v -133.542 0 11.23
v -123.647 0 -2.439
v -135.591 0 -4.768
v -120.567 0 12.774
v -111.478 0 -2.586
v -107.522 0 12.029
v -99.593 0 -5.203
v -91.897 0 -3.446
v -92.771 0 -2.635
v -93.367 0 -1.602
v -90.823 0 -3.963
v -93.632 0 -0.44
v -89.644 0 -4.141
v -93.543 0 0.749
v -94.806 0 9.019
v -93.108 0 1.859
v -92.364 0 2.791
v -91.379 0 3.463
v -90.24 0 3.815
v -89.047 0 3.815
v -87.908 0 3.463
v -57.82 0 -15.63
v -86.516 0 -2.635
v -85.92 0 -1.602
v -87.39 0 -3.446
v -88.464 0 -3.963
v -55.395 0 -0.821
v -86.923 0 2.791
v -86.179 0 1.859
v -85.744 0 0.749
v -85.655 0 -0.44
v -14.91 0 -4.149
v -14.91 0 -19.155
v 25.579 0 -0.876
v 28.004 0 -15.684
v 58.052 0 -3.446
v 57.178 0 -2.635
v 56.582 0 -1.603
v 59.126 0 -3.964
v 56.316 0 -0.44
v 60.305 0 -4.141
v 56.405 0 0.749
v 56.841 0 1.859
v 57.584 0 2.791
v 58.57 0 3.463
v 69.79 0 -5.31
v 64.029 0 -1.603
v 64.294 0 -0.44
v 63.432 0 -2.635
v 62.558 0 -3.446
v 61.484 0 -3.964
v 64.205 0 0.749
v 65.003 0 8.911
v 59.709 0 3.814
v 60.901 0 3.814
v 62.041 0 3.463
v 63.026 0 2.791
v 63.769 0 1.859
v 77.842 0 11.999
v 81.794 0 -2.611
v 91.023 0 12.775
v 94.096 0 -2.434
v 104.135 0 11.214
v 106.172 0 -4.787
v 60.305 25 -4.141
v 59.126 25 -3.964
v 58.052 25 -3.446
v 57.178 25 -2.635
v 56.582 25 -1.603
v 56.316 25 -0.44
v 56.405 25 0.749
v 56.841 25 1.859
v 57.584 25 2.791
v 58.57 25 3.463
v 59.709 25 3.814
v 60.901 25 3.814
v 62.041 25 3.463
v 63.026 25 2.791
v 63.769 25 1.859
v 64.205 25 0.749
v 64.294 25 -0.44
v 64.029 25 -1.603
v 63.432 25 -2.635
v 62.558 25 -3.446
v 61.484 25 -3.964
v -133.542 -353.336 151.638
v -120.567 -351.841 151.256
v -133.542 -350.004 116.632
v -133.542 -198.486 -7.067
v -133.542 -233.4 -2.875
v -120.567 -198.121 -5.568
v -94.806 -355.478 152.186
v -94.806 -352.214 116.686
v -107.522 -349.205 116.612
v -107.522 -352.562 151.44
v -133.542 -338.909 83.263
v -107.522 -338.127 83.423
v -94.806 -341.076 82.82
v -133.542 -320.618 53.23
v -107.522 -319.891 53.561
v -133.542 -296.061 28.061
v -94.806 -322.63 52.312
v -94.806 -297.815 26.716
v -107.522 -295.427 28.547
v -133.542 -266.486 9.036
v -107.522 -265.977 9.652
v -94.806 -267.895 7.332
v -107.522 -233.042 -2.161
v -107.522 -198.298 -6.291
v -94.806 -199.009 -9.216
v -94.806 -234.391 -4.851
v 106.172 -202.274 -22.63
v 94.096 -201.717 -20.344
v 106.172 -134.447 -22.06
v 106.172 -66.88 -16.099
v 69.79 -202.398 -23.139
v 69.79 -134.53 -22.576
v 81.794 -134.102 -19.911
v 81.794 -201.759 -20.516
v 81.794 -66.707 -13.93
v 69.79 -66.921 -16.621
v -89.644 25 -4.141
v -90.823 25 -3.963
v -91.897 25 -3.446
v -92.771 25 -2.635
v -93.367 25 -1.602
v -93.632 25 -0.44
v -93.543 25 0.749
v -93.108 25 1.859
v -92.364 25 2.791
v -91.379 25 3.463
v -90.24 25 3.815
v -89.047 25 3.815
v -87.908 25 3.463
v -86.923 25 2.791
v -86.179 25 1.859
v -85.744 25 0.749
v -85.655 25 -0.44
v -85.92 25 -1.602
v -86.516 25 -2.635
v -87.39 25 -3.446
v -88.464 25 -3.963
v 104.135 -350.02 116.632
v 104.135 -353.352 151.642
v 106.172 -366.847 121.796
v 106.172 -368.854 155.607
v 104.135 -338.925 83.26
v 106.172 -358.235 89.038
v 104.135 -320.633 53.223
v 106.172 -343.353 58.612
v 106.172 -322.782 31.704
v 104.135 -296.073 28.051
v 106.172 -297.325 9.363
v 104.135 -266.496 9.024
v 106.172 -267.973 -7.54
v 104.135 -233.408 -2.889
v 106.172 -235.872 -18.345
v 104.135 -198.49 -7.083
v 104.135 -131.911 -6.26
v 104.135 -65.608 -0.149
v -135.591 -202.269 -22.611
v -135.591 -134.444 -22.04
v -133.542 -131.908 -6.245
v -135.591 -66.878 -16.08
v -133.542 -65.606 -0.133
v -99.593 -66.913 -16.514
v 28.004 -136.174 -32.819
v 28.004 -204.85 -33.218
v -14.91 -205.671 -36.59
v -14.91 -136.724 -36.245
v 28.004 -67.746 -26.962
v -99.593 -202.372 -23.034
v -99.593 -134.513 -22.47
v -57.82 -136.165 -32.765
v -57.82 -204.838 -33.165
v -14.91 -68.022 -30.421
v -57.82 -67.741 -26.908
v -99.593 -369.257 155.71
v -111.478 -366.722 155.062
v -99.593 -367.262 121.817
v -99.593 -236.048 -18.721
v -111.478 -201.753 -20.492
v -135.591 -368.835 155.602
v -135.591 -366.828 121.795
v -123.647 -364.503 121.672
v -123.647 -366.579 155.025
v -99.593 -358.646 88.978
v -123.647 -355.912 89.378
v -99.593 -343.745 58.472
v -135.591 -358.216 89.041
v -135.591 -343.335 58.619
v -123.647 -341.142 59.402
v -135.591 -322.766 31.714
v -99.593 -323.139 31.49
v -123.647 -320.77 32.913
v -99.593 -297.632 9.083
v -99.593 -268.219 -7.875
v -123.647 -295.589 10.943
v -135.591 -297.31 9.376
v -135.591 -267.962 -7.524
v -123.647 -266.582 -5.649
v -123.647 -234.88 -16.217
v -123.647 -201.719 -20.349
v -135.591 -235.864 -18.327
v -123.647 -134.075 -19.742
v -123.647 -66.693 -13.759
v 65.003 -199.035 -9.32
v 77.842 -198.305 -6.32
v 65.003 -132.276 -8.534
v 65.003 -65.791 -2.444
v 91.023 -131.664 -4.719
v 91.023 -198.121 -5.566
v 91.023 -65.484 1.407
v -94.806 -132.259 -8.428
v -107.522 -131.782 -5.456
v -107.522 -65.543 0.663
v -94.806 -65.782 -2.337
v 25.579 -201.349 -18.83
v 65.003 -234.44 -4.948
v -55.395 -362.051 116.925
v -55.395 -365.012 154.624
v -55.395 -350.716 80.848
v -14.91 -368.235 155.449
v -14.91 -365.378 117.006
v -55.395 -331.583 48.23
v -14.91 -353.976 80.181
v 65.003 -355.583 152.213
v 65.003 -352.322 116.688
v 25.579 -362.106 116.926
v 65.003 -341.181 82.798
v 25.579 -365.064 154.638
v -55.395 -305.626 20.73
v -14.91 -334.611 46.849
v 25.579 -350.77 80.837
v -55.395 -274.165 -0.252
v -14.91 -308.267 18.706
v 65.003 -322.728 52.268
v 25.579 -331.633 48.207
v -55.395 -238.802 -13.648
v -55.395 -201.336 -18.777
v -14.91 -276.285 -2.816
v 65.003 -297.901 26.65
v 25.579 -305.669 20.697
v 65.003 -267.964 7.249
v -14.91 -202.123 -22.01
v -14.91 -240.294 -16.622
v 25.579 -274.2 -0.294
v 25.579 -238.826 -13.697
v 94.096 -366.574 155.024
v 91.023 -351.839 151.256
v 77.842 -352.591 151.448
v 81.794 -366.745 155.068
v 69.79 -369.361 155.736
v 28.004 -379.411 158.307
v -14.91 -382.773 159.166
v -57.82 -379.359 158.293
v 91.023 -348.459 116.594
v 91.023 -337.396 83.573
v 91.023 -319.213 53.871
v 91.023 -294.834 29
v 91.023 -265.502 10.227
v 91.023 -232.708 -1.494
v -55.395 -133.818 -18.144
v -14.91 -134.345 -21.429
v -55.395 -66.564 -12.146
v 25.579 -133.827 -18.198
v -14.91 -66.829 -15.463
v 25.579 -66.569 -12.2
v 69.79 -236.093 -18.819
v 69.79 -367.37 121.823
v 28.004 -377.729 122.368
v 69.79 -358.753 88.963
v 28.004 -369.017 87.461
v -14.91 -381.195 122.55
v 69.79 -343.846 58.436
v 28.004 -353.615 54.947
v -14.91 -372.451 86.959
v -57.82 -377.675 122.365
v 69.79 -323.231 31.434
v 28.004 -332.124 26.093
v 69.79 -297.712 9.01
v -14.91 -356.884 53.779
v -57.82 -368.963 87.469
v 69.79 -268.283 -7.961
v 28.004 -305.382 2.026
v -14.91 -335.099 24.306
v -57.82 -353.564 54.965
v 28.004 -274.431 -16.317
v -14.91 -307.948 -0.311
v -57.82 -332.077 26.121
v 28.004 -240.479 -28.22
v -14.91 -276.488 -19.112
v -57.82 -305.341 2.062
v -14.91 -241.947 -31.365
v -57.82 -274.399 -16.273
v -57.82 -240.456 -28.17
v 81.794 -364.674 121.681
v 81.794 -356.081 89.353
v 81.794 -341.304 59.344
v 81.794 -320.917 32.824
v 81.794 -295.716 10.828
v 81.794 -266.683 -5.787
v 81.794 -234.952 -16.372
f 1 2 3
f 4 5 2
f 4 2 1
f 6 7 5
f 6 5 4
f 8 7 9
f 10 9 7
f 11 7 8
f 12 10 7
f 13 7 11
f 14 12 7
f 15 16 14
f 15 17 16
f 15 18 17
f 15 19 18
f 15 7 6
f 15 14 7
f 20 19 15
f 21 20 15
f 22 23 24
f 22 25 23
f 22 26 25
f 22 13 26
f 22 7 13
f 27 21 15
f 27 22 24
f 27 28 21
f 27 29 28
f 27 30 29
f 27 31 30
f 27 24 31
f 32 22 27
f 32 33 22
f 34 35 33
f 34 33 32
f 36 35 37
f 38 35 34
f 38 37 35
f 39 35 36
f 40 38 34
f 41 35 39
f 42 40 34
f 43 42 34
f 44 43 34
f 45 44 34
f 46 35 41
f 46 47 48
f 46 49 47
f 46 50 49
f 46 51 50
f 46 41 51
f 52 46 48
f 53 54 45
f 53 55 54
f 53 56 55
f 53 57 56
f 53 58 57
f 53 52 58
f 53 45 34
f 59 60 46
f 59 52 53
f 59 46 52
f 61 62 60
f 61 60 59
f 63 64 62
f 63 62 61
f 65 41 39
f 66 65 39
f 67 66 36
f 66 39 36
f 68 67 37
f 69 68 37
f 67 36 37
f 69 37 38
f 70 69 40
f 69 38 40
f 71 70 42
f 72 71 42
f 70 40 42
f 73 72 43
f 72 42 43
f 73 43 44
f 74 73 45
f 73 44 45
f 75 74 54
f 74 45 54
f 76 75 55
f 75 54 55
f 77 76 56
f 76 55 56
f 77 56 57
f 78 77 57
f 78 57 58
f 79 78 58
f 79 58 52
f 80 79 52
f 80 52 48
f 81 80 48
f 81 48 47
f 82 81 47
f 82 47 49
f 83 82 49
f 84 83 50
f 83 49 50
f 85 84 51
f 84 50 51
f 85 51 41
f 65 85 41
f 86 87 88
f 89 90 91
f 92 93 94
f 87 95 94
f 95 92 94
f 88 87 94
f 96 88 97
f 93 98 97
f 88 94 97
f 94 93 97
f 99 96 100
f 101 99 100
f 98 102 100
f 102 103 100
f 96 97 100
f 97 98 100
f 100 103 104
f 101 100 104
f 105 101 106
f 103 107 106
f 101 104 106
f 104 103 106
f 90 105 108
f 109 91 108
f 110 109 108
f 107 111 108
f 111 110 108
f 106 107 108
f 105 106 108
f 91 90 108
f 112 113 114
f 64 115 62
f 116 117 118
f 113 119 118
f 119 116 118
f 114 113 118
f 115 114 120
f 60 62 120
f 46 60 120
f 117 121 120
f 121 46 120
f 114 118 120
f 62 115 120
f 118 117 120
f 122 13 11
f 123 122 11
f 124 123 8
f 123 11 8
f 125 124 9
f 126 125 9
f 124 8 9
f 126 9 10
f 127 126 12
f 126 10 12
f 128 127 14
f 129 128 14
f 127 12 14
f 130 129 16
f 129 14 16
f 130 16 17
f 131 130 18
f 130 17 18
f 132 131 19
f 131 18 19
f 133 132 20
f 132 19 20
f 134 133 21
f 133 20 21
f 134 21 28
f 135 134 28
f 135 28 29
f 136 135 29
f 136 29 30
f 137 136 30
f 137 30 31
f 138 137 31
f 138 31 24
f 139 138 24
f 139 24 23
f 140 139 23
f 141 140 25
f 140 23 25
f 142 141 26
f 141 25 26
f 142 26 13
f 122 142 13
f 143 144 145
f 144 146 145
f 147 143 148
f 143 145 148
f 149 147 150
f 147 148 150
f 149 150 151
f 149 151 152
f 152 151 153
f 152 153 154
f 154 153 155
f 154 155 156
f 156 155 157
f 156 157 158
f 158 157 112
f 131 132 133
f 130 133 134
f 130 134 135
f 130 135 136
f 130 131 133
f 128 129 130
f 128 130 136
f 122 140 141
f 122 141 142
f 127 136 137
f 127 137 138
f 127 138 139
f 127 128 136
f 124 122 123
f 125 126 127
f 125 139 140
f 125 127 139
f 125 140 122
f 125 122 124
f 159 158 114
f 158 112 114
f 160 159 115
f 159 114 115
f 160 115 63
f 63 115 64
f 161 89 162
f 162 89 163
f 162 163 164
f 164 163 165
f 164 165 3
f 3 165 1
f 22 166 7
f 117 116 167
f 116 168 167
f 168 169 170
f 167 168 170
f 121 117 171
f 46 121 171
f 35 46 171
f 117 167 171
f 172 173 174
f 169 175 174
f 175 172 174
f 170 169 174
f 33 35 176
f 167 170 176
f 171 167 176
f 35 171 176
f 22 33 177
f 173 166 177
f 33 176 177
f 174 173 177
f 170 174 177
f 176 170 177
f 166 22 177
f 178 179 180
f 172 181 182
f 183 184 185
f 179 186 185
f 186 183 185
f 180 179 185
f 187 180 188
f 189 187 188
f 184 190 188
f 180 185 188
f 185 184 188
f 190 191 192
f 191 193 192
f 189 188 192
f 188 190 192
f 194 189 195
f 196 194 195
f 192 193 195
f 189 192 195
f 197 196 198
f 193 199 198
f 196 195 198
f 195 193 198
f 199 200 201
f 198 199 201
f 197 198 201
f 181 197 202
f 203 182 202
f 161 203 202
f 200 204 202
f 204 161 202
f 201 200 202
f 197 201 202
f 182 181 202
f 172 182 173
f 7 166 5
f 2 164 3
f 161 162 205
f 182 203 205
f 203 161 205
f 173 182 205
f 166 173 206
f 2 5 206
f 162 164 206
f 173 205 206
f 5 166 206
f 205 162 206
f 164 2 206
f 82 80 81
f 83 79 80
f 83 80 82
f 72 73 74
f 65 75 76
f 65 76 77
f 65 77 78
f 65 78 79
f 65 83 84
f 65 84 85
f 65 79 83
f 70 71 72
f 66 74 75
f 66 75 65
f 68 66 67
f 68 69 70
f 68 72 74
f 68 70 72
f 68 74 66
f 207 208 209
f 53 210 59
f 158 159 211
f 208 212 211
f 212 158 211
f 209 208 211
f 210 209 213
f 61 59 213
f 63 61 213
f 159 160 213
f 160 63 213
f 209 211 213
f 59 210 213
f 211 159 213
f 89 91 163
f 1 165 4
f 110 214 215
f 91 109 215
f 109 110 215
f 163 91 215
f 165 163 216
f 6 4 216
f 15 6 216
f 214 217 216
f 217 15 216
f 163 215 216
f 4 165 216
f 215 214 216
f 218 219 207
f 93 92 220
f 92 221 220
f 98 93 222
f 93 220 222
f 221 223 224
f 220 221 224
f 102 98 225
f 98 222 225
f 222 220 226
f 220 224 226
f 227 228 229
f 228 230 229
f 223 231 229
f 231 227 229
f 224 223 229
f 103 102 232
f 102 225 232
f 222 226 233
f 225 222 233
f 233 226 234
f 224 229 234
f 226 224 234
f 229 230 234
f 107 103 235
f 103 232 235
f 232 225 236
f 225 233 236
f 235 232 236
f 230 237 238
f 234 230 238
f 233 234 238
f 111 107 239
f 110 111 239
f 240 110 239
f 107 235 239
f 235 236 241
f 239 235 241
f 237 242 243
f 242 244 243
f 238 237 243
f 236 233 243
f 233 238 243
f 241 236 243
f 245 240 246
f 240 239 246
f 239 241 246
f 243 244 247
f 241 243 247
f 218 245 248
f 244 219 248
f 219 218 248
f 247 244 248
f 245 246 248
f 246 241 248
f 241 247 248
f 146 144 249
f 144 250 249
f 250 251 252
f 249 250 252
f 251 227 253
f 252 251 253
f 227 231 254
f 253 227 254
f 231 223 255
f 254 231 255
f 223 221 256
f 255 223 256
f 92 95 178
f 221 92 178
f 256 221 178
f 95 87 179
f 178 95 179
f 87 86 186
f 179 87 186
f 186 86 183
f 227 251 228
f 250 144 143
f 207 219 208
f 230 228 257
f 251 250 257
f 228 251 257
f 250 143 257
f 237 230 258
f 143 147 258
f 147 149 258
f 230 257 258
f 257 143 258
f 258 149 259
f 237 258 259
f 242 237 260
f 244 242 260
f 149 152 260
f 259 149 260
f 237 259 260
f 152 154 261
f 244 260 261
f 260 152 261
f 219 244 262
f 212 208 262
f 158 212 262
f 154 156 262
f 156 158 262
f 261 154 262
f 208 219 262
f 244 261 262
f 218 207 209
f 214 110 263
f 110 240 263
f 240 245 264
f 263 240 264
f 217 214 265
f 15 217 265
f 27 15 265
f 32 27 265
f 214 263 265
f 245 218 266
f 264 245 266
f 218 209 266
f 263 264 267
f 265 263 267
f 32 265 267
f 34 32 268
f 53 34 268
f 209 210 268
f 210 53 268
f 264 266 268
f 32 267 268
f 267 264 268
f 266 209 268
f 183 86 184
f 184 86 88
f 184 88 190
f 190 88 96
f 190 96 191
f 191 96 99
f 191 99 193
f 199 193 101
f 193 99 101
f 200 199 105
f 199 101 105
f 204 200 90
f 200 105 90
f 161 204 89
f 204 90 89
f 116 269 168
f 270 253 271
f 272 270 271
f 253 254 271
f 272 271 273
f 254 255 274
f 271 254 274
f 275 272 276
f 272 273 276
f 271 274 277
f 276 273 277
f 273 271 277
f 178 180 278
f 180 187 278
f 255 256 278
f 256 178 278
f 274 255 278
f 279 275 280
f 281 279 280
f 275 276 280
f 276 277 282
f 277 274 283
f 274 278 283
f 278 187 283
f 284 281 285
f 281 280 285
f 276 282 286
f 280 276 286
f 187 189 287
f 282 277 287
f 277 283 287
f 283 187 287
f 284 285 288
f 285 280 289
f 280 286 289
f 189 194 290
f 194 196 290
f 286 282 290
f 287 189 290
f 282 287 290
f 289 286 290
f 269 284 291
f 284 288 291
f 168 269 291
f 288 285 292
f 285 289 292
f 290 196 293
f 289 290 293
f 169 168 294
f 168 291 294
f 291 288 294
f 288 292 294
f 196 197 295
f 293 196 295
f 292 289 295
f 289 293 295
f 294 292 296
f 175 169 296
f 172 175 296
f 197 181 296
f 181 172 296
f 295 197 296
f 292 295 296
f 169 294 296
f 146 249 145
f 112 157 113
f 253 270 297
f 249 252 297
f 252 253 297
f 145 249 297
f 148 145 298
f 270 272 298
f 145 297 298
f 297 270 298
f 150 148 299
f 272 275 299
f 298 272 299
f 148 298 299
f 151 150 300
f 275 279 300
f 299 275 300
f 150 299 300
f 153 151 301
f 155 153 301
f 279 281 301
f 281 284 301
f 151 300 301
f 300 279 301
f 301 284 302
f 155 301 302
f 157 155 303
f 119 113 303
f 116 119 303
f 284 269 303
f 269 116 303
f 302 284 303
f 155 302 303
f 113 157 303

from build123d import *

# Parameters (mm, degrees)
SKETCH4_R           = 4
BOSS_EXTRUDE1_DEPTH = 25


with BuildPart() as part:
    # Sweep1: sweep along a path in Sketch3
    with BuildLine(Plane(origin=(0, 0, 0), x_dir=(0, 0, -1), z_dir=(1, 0, 0))) as sweep1_path:
        ThreePointArc((-156.490372524, -372.309269532), (-29.86748259, -325.839888984), (26.095604491, -203.117061165))
        ThreePointArc((26.095604491, -203.117061165), (23.292710008, -101.028489157), (8.353595888, 0))
    # Sketch2 → Sweep1 (sweep)
    with BuildSketch(Plane(origin=(0, 0, 0), x_dir=(1, 0, 0), z_dir=(0, 1, 0))):
        with BuildLine():
            Line((106.171721078, 4.787075913), (104.135409967, -11.214194161))
            ThreePointArc((104.135409967, -11.214194161), (84.415389077, -12.679452198), (65.003317638, -8.911470313))
            ThreePointArc((65.003317638, -8.911470313), (-14.910313161, 4.148624374), (-94.806270602, -9.019156209))
            ThreePointArc((-94.806270602, -9.019156209), (-114.028080974, -12.687418048), (-133.542450498, -11.230187465))
            Line((-133.542450498, -11.230187465), (-135.591251757, 4.767644245))
            ThreePointArc((-135.591251757, 4.767644245), (-117.558432017, 2.20143547), (-99.592921033, 5.202840203))
            ThreePointArc((-99.592921033, 5.202840203), (-14.910259594, 19.154520277), (69.790065455, 5.310479613))
            ThreePointArc((69.790065455, 5.310479613), (87.939964024, 2.203796687), (106.171721078, 4.787075913))
        make_face()
    sweep(path=sweep1_path.line)

    # Sketch4 → Boss-Extrude1 (add)
    with BuildSketch(Plane(origin=(0, 0, 0), x_dir=(1, 0, 0), z_dir=(0, 1, 0))):
        with Locations(Location((-89.64350233, 0.1407291, 0), (0, 0, 90))):
            Circle(SKETCH4_R)
        with Locations(Location((60.305101164, 0.141223038, 0), (0, 0, 90))):
            Circle(SKETCH4_R)
    extrude(amount=BOSS_EXTRUDE1_DEPTH)


solid = part.part
